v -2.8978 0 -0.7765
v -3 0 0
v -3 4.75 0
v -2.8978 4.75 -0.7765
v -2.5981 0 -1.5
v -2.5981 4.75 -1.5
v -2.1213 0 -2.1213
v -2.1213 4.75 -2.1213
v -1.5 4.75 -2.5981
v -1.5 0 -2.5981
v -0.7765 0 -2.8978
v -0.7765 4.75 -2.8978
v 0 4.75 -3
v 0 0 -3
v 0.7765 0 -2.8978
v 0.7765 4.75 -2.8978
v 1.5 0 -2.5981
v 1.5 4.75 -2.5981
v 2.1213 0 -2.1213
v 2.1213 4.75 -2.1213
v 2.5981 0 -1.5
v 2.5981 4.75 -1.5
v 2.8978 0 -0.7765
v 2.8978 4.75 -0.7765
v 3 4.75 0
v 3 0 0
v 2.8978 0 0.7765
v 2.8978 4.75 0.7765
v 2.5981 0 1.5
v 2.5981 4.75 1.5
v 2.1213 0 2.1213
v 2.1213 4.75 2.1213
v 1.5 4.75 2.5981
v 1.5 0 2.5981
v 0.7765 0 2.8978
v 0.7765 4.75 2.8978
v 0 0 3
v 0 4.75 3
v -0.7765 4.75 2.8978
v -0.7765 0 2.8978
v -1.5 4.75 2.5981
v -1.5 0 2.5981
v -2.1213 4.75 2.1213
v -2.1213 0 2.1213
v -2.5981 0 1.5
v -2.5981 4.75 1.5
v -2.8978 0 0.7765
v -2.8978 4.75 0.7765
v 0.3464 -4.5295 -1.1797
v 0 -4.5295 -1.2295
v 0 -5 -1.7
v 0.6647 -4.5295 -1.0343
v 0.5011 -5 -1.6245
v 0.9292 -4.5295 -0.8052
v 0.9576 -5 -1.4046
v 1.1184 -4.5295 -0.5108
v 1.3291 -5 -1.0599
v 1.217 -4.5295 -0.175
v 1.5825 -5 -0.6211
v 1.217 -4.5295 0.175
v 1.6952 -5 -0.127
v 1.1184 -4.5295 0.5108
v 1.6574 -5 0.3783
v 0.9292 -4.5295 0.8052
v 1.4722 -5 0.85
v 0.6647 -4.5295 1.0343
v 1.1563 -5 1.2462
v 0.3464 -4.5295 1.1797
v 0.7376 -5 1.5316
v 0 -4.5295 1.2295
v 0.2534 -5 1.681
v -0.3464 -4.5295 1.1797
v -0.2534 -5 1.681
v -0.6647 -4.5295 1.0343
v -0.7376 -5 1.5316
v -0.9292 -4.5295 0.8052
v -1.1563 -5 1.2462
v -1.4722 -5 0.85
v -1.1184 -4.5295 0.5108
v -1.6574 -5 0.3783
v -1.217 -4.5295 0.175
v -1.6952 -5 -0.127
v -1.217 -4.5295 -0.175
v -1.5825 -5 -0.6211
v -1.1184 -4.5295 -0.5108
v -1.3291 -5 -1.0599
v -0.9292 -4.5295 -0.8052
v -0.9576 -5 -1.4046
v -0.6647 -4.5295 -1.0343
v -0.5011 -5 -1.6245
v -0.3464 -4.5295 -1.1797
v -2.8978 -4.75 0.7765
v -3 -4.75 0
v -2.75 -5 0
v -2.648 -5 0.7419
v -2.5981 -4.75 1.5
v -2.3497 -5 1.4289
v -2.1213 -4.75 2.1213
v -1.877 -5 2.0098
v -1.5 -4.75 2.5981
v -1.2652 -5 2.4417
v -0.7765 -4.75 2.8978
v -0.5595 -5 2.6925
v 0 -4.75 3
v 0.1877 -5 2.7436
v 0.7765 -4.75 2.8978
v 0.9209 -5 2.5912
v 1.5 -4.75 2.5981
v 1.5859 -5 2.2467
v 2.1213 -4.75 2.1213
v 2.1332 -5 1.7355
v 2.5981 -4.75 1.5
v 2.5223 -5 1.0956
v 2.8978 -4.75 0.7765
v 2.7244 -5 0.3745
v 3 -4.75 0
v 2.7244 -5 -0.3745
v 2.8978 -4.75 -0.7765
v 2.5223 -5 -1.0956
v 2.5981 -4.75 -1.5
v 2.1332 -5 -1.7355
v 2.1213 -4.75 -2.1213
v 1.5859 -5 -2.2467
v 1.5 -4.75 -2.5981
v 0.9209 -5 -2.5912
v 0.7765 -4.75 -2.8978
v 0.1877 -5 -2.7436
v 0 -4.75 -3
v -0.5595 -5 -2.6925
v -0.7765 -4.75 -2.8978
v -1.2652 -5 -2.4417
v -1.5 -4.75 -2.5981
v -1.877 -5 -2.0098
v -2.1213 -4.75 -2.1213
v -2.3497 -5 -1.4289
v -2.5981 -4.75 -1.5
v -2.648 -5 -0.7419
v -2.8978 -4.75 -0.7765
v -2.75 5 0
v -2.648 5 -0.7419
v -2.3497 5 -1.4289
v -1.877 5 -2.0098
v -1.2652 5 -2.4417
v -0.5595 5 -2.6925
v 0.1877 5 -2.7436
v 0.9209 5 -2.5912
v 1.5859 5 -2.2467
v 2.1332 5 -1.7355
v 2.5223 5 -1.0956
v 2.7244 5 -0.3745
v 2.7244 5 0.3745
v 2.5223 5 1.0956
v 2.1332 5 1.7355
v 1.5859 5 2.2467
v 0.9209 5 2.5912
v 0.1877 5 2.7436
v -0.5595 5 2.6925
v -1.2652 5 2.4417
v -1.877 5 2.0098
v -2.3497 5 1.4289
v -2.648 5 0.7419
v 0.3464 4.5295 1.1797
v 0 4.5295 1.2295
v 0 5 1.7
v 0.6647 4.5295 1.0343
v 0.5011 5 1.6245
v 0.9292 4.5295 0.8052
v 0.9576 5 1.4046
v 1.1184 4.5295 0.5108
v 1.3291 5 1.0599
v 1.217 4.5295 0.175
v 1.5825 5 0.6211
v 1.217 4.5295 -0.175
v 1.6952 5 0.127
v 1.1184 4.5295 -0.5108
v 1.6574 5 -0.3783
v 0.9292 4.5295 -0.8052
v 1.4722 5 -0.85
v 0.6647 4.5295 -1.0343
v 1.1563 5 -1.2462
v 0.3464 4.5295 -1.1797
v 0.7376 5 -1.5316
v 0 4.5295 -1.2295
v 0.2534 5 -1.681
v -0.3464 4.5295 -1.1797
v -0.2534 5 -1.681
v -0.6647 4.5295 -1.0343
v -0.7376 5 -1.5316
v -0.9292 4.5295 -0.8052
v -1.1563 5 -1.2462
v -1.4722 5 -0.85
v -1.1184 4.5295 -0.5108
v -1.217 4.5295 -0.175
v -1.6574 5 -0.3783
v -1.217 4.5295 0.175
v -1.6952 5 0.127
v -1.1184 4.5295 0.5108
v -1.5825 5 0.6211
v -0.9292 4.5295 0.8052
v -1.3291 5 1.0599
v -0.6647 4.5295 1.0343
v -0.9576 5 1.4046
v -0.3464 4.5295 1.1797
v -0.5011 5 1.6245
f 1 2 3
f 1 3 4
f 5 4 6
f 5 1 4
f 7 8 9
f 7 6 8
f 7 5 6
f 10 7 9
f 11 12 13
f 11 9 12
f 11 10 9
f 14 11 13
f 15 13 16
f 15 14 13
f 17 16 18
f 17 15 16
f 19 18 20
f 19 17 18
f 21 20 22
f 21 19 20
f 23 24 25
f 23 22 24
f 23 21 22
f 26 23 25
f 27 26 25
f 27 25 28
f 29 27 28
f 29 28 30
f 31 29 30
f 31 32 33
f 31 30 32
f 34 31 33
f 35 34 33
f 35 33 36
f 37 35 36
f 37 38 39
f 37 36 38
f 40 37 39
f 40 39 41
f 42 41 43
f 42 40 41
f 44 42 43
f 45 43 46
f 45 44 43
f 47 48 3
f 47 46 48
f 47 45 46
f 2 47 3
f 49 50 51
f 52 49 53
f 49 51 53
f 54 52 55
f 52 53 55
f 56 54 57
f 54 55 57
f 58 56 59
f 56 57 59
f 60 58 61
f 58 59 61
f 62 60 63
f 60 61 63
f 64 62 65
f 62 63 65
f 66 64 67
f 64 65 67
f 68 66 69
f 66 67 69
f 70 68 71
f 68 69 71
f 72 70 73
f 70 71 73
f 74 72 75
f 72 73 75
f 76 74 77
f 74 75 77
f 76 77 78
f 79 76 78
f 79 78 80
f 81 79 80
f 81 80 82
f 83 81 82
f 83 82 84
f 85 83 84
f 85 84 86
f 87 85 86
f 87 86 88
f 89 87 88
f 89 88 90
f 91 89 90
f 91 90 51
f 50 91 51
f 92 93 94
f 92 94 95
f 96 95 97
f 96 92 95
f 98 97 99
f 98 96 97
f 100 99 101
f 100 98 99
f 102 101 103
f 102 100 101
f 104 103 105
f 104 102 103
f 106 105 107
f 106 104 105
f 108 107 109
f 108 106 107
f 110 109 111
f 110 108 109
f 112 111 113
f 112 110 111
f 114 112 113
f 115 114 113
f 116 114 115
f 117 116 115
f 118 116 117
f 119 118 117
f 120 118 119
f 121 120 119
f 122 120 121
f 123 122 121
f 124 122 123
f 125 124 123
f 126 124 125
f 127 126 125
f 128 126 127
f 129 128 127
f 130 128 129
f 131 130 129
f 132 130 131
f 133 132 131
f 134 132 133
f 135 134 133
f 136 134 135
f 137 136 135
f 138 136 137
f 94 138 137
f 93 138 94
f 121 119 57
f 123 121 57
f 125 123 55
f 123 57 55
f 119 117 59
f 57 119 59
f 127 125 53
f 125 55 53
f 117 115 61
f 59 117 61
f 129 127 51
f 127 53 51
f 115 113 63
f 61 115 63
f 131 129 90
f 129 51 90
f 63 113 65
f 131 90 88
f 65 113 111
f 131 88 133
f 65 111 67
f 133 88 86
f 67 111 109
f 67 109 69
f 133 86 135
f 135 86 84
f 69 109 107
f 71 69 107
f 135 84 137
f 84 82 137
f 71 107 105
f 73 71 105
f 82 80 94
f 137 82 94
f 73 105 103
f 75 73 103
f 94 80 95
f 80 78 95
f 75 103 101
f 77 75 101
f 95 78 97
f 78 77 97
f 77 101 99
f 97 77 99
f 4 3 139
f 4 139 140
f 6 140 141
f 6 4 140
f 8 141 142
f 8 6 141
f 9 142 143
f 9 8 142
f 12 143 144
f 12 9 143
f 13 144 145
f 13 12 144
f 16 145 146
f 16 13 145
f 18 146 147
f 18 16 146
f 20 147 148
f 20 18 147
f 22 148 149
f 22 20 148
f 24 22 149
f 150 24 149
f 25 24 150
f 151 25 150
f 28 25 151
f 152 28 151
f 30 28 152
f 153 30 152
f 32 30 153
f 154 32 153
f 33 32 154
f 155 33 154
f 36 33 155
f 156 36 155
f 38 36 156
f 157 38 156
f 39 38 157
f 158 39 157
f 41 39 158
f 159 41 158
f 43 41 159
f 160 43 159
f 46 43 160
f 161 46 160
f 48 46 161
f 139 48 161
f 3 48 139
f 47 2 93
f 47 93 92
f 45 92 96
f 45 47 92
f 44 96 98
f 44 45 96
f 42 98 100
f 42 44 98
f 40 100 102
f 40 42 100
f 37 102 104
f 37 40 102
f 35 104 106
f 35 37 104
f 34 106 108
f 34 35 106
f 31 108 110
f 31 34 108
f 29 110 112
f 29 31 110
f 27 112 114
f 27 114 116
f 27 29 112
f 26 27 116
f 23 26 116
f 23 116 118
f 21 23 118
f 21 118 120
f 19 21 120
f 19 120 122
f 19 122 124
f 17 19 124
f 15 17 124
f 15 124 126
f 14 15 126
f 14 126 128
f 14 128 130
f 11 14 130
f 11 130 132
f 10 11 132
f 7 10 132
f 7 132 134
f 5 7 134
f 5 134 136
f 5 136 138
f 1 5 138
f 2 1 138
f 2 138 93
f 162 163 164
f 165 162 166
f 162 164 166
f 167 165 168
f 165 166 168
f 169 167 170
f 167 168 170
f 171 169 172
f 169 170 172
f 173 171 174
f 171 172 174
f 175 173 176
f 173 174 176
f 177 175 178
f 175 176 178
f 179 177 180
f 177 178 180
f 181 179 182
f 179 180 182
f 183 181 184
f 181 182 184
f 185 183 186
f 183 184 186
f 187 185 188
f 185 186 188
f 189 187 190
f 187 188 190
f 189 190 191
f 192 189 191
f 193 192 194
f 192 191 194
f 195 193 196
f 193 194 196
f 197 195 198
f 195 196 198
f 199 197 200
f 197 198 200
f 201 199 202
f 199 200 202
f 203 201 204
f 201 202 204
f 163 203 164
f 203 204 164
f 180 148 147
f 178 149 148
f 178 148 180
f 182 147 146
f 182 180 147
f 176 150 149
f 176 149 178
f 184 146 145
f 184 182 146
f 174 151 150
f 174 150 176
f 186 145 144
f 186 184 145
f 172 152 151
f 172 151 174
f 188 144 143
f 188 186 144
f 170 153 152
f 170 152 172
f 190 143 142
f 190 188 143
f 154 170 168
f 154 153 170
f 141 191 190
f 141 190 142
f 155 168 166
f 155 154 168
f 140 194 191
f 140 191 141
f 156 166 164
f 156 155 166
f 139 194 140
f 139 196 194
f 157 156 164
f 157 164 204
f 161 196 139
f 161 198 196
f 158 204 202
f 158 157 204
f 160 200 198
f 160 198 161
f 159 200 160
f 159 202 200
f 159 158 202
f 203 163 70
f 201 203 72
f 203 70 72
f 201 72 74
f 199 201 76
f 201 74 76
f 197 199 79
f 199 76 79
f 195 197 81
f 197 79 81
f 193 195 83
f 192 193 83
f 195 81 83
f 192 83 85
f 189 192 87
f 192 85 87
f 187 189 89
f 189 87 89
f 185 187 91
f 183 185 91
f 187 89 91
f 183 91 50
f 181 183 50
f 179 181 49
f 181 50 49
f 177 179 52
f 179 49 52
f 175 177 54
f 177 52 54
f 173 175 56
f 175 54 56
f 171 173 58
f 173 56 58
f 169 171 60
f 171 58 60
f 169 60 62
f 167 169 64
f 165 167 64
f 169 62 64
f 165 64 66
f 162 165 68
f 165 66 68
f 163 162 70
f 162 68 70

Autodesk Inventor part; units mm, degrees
ref_plane "YZ Plane" through (0, 0, 0) normal (1, 0, 0) x (0, 1, 0)
ref_plane "XZ Plane" through (0, 0, 0) normal (0, 1, 0) x (-1, 0, 0)
ref_plane "XY Plane" through (0, 0, 0) normal (0, 0, 1) x (1, 0, 0)
sketch "スケッチ1" plane through (0, 0, 0) normal (0, 1, 0) x (-1, 0, 0)
  circle A0 centre (0, 0) radius 3
  dimension "d0" = 6
extrude "押し出し1" add sketch "スケッチ1" along normal mid plane 10
sketch "スケッチ2" plane through (0, 5, 0) normal (0, 1, 0) x (1, 0, 0)
  point P0 (0, 0)
  point P1 (0, 0)
hole "穴1" at (0, 5, 0) direction (0, -1, 0) diameter 2.459 depth 10 countersink diameter 3.4 countersink angle 90 thread size "M3x0.5" class "6H" standard "ISO Metric profile"
sketch "スケッチ3" plane through (0, -5, 0) normal (0, -1, 0) x (1, 0, 0)
  point P0 (0, 0)
  point P1 (0, 0)
hole "穴2" at (0, -5, 0) direction (0, 1, 0) diameter 2.459 depth 10 countersink diameter 3.4 countersink angle 90 thread size "M3x0.5" class "6H" standard "ISO Metric profile"
chamfer "面取り1" distance 0.25 angle 45 2 edges at (3, -5, 0) (3, 5, 0)
properties part number "Spacer_M3D6L60" material "アルミニウム 6061"
